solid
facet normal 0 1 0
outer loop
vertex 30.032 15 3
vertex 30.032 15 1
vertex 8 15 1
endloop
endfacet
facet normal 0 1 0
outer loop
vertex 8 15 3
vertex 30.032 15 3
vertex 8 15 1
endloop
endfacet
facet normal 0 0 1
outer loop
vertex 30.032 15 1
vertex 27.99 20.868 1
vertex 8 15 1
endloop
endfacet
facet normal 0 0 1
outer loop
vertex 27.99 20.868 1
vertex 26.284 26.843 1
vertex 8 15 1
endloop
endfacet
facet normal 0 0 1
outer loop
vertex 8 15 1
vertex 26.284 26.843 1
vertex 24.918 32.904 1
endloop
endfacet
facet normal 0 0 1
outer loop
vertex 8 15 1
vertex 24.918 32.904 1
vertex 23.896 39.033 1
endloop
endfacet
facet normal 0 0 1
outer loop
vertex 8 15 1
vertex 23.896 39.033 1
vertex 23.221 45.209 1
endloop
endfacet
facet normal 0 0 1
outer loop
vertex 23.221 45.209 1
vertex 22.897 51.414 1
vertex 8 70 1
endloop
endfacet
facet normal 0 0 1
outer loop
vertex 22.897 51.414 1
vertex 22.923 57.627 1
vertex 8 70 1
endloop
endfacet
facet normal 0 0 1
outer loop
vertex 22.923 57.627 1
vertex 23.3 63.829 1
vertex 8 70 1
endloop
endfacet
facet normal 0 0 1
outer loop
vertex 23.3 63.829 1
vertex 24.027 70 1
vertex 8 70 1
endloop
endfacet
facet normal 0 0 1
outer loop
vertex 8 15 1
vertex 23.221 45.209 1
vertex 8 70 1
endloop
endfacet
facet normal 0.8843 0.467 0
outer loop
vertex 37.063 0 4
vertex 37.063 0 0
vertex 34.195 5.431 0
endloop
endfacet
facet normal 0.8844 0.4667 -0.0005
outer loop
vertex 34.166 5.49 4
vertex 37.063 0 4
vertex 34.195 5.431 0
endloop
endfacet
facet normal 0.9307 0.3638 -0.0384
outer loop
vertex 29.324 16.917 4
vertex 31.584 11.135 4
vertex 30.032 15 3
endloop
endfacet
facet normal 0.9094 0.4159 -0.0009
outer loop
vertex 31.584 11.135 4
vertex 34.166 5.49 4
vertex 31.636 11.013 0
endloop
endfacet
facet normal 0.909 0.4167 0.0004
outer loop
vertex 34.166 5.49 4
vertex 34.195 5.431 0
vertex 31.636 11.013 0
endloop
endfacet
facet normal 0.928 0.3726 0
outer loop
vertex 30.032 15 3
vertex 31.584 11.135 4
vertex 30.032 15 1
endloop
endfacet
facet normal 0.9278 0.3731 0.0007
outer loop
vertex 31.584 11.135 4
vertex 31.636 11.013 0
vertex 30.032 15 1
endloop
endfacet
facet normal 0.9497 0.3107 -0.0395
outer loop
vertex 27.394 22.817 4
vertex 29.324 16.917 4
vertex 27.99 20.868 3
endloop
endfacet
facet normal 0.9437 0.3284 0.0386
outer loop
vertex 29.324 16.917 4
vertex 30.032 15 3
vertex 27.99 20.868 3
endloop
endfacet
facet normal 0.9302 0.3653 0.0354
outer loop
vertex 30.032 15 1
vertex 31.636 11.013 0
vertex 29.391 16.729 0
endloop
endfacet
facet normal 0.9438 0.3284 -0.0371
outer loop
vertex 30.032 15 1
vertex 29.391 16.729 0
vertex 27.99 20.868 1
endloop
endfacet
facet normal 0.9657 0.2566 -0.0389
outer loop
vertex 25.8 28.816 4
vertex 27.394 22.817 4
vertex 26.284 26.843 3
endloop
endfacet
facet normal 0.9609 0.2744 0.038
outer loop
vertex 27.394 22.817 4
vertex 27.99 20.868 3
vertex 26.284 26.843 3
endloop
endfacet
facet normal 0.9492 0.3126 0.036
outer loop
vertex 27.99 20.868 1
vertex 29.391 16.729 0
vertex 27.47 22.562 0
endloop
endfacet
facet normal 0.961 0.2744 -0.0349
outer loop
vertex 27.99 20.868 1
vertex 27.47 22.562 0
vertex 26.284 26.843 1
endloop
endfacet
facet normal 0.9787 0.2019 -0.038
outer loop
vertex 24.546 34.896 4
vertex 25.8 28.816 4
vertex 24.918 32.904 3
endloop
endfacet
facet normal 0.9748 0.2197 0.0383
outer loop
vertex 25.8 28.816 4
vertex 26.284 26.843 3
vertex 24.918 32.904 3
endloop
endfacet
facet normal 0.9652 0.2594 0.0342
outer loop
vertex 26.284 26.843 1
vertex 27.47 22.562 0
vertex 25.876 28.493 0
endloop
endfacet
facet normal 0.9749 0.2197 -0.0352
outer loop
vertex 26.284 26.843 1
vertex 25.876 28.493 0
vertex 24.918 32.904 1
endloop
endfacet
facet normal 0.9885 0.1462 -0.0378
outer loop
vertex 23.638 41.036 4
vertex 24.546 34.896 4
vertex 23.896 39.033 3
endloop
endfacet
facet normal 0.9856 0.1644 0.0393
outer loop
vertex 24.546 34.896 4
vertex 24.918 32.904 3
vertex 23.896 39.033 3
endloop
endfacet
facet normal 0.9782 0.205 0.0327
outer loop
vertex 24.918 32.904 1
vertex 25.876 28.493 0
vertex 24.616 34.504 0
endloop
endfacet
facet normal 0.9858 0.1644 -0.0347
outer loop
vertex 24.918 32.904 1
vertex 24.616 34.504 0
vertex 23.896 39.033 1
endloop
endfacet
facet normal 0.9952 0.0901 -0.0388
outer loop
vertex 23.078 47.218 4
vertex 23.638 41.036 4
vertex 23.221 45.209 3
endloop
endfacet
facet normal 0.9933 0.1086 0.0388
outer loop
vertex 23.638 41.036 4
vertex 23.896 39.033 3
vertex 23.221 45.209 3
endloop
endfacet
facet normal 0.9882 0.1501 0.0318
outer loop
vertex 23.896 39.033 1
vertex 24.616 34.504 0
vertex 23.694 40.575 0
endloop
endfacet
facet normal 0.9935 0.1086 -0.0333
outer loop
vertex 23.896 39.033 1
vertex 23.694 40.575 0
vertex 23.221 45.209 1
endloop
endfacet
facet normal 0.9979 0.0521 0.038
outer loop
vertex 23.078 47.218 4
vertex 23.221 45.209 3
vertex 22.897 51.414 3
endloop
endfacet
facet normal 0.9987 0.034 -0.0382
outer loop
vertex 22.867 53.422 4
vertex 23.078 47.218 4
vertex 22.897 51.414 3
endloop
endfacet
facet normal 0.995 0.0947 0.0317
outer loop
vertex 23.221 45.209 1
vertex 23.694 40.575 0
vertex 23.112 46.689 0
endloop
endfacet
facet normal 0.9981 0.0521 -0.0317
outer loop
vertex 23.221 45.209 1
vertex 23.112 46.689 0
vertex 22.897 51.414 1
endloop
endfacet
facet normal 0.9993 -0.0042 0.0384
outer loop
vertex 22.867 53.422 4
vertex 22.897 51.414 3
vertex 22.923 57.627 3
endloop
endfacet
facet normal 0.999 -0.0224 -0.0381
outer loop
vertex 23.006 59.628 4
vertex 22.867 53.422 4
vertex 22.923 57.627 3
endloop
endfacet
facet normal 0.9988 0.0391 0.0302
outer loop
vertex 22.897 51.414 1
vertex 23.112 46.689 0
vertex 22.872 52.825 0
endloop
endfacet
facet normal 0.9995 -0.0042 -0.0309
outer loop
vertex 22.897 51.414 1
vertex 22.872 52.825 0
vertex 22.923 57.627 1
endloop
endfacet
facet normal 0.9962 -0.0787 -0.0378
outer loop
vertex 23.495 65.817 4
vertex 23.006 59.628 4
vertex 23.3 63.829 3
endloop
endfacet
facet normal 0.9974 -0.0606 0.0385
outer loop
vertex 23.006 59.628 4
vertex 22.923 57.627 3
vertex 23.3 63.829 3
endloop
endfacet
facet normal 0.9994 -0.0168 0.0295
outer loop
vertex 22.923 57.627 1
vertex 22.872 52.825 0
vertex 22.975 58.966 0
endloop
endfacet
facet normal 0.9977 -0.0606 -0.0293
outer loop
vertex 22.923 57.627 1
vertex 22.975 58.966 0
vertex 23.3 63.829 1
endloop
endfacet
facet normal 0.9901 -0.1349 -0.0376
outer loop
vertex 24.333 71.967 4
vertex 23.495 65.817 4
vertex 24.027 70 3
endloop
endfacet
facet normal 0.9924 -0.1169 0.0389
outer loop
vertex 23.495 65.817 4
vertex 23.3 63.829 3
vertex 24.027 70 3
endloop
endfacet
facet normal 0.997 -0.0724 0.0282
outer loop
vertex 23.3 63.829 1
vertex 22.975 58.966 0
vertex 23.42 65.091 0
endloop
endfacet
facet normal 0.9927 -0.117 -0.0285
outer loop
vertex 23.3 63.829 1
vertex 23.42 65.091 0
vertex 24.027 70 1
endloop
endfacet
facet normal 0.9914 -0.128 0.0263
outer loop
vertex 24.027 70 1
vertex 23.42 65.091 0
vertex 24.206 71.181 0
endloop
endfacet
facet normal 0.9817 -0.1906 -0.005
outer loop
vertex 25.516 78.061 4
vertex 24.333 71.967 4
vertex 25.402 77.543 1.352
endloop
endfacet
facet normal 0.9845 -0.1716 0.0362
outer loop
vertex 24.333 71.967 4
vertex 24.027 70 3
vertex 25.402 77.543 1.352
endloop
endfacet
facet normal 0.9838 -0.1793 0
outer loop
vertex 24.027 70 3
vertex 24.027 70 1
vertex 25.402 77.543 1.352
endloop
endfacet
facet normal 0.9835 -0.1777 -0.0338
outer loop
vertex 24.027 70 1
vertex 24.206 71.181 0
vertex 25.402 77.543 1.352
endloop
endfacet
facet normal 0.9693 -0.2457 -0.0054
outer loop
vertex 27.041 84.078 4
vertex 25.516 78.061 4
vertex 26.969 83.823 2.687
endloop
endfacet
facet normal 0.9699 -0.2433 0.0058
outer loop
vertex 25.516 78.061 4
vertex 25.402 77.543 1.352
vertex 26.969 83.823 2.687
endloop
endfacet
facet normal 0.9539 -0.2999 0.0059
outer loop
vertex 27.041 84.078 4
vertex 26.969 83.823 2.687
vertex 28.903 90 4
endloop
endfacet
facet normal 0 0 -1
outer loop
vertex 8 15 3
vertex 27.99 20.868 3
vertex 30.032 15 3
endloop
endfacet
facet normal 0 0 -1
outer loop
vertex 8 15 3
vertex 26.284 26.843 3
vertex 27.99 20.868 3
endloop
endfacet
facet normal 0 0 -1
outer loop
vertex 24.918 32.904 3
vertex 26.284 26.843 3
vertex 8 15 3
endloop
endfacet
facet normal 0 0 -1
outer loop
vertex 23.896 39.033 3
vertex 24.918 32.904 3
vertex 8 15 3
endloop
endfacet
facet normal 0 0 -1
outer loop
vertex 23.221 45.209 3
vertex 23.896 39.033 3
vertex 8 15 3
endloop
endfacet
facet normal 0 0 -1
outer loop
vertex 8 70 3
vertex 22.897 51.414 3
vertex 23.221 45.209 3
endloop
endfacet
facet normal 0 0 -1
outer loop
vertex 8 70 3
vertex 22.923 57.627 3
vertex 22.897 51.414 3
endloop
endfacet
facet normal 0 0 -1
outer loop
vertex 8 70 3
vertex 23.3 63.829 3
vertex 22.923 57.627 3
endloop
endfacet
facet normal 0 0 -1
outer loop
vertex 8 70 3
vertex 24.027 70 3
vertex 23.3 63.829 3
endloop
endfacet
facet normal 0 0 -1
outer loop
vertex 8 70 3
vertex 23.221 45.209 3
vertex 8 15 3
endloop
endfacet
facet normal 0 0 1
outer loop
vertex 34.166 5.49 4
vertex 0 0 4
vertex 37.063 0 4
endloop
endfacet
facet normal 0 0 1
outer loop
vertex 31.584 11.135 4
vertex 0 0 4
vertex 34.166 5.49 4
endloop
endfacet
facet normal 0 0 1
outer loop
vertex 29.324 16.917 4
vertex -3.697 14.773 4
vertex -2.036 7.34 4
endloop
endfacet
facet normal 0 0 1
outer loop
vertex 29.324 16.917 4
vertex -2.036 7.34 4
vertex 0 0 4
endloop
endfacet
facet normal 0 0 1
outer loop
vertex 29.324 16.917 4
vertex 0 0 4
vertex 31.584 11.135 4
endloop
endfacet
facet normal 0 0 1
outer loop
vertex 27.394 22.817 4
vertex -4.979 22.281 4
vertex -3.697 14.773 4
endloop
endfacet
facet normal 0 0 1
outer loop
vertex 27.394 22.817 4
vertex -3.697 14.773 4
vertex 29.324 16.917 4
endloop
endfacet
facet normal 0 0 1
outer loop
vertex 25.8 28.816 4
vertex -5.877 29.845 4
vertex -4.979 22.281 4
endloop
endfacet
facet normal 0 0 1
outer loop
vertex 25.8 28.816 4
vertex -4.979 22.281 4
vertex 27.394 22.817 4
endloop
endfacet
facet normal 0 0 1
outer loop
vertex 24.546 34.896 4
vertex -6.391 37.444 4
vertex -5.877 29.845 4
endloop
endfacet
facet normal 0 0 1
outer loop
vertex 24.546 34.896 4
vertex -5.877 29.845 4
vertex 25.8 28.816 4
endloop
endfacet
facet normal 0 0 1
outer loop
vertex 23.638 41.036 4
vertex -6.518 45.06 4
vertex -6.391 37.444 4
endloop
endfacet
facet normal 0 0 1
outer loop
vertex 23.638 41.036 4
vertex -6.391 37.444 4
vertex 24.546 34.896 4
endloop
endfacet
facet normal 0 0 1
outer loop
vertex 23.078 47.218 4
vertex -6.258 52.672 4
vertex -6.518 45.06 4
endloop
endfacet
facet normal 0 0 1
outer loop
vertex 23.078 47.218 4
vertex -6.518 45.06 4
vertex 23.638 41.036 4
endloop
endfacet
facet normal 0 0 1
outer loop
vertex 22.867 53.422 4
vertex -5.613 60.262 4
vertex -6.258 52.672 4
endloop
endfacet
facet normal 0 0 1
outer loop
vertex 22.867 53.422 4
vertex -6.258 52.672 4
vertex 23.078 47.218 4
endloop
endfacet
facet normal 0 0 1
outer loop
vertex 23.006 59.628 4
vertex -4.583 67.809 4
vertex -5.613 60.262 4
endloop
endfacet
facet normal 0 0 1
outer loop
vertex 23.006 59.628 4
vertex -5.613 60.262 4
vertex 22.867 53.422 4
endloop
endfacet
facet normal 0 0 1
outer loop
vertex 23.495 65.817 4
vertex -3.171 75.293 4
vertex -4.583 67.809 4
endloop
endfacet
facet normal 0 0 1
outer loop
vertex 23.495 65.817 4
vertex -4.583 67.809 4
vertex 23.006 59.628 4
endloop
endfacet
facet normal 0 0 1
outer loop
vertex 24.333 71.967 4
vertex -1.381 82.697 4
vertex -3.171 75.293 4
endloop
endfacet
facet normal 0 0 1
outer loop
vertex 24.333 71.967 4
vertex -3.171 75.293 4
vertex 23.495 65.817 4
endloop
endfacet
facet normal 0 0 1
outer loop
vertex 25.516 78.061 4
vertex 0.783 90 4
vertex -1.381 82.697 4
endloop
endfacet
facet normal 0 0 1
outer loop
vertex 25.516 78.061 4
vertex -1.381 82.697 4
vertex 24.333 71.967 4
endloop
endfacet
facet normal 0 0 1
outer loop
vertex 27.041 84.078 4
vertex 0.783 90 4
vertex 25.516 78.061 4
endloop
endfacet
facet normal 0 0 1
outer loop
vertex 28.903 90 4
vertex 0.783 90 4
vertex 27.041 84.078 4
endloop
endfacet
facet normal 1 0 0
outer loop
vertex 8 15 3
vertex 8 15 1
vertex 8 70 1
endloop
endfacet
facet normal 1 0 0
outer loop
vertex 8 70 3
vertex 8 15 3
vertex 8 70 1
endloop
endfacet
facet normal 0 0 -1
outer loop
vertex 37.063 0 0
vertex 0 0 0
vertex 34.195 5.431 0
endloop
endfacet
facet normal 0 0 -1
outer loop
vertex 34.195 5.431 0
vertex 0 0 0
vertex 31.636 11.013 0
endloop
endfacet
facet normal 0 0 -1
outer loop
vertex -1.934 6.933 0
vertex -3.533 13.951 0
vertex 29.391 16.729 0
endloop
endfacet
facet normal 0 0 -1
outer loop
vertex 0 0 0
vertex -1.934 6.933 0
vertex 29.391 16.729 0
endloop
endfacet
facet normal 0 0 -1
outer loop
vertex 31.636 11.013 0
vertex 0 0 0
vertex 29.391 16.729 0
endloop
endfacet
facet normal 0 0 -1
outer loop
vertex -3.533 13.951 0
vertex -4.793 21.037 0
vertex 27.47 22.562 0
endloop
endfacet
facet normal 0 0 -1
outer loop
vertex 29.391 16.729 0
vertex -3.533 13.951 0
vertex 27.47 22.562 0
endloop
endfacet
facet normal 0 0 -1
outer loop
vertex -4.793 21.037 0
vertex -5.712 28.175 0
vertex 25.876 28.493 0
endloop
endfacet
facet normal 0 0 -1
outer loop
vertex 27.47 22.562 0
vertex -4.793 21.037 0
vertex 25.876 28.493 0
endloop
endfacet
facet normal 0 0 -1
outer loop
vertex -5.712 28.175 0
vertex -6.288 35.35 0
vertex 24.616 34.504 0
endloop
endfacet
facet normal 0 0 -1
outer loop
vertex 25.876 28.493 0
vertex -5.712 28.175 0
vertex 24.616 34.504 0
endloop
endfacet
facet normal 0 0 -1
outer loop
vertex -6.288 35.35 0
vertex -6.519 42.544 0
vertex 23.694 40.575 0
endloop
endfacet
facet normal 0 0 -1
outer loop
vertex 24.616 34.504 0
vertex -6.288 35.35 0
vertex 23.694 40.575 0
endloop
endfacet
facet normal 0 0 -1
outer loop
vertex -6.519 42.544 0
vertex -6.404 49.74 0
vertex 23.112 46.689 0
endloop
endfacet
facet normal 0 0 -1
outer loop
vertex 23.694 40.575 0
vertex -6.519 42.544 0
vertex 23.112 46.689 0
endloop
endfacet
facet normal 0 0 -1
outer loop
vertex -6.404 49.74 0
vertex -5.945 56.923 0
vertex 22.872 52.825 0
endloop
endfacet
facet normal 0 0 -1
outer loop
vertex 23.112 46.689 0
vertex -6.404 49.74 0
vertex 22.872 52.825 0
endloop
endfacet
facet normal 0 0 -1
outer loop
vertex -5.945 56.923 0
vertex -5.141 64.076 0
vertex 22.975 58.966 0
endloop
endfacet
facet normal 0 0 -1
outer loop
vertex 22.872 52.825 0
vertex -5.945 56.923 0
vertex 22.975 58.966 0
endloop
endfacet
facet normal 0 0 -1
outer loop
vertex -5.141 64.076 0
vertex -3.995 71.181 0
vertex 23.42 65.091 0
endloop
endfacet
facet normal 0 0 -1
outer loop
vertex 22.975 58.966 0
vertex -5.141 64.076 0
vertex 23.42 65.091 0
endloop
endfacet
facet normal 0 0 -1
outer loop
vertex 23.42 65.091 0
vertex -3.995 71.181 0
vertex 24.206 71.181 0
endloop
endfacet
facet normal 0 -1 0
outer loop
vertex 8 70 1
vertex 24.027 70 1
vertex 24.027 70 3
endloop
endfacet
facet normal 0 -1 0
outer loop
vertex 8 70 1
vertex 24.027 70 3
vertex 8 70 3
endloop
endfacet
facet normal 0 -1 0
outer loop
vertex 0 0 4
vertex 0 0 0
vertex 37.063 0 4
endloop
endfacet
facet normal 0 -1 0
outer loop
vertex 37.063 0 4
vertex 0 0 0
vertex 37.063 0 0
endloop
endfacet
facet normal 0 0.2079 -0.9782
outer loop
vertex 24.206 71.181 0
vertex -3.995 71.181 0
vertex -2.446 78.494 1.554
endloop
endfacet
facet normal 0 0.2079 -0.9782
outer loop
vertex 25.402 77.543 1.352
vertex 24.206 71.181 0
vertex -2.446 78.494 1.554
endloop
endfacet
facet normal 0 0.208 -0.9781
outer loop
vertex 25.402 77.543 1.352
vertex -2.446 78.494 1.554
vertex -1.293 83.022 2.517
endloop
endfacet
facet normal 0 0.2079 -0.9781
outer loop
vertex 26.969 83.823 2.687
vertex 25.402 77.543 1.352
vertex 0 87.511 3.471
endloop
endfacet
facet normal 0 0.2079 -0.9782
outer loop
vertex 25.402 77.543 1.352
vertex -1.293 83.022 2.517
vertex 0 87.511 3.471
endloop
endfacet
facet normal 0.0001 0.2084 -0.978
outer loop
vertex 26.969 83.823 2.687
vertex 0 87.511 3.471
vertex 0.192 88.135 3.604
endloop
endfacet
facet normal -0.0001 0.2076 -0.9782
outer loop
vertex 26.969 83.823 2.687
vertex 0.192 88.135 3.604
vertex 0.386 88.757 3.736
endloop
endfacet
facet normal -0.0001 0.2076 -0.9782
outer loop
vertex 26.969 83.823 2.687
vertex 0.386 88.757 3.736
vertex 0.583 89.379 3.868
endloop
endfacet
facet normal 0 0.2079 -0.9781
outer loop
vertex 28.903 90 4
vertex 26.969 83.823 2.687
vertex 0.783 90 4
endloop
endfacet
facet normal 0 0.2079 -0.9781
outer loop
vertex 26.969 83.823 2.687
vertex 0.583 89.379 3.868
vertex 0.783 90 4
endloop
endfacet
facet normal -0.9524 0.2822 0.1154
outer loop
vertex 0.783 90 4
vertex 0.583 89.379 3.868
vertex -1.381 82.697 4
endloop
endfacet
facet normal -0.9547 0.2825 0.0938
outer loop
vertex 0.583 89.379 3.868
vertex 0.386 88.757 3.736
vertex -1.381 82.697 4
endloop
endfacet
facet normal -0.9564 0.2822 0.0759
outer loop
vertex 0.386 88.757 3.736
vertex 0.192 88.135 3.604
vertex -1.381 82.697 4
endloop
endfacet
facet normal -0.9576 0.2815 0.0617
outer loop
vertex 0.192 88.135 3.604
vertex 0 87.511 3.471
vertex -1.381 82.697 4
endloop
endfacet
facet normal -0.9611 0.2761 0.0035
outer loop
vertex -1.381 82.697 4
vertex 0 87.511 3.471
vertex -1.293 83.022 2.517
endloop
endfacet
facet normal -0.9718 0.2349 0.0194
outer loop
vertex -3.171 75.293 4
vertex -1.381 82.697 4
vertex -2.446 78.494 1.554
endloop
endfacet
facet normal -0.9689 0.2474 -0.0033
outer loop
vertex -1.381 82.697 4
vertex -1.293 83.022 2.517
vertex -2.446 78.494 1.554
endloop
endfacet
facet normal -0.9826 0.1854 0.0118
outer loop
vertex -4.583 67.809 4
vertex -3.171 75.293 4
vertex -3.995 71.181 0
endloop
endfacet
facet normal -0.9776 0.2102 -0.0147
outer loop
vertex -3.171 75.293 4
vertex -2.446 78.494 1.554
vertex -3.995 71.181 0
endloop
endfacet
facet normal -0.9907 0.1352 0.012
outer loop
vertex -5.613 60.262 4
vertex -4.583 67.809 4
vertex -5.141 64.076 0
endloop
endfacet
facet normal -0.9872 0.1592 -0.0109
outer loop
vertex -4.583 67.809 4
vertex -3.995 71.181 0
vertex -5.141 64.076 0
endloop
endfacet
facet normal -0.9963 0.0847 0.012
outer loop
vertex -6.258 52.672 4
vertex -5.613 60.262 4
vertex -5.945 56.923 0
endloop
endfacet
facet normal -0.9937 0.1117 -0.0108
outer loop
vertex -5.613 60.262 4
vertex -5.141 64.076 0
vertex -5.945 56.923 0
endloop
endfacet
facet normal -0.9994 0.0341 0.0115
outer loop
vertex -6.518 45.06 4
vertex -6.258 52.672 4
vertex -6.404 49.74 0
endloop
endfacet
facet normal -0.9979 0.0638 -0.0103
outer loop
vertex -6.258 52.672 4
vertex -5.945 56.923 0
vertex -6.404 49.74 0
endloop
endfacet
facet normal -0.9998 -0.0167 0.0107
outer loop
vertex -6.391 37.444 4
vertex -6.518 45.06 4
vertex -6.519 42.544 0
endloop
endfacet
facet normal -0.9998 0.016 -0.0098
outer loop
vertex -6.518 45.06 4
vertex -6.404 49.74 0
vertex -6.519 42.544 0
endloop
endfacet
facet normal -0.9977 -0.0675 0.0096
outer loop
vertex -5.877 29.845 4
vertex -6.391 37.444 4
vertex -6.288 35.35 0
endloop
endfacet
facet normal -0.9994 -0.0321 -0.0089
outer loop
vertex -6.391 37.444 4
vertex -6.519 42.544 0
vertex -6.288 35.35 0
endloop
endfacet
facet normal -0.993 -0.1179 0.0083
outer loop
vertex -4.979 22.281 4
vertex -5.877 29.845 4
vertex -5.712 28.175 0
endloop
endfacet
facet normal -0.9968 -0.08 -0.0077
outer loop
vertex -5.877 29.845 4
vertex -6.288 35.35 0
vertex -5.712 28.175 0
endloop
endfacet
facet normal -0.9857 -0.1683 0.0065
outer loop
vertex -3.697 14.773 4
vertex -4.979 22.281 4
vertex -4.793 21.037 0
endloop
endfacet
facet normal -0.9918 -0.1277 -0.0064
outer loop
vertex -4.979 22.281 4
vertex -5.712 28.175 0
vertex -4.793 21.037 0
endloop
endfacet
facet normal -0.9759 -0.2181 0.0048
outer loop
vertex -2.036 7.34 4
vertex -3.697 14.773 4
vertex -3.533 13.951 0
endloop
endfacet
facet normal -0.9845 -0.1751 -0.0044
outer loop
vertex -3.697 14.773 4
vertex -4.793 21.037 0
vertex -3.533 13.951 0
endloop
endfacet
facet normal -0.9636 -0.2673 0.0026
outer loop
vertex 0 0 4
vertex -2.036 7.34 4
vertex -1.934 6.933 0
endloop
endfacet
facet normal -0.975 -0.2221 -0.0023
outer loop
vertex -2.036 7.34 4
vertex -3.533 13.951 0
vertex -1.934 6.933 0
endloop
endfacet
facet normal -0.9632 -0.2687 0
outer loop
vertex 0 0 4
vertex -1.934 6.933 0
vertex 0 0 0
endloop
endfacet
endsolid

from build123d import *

# Parameters (mm, degrees)
EXTRUDE_1_DEPTH          = 4
CUT_EXTRUDE_1_DEPTH      = 38.06287663
CUT_EXTRUDE_1_DEPTH_BACK = 7.523724759
SKETCH_3_W               = 30
SKETCH_3_H               = 55
CUT_EXTRUDE_2_DEPTH      = 1


with BuildPart() as part:
    # 草图1 → 凸台-拉伸1 (new body)
    with BuildSketch(Plane.XY):
        with BuildLine():
            Line((0, 0), (37.06287663, 0))
            ThreePointArc((37.06287663, 0), (23.31417126, 44.123406063), (28.903445872, 90))
            Line((28.903445872, 90), (0.782681423, 90))
            ThreePointArc((0.782681423, 90), (-6.518052949, 45.060087267), (0, 0))
        make_face()
    extrude(amount=EXTRUDE_1_DEPTH)

    # 草图2 → 切除-拉伸1 (cut, two sides)
    with BuildSketch(Plane(origin=(0, 0, 0), x_dir=(0, 0, -1), z_dir=(1, 0, 0))) as cut_extrude_1_sk:
        Polygon((-4, 90), (0, 90), (0, 71.181479562), align=None)
    extrude(amount=CUT_EXTRUDE_1_DEPTH, mode=Mode.SUBTRACT)
    extrude(cut_extrude_1_sk.sketch, amount=-CUT_EXTRUDE_1_DEPTH_BACK, mode=Mode.SUBTRACT)

    # 草图3 → 切除-拉伸2 (cut, symmetric)
    with BuildSketch(Plane(origin=(0, 0, 2), x_dir=(-1, 0, 0), z_dir=(0, 0, -1))):
        with Locations((-23, 42.5)):
            Rectangle(SKETCH_3_W, SKETCH_3_H)
    extrude(amount=CUT_EXTRUDE_2_DEPTH, both=True, mode=Mode.SUBTRACT)


solid = part.part
